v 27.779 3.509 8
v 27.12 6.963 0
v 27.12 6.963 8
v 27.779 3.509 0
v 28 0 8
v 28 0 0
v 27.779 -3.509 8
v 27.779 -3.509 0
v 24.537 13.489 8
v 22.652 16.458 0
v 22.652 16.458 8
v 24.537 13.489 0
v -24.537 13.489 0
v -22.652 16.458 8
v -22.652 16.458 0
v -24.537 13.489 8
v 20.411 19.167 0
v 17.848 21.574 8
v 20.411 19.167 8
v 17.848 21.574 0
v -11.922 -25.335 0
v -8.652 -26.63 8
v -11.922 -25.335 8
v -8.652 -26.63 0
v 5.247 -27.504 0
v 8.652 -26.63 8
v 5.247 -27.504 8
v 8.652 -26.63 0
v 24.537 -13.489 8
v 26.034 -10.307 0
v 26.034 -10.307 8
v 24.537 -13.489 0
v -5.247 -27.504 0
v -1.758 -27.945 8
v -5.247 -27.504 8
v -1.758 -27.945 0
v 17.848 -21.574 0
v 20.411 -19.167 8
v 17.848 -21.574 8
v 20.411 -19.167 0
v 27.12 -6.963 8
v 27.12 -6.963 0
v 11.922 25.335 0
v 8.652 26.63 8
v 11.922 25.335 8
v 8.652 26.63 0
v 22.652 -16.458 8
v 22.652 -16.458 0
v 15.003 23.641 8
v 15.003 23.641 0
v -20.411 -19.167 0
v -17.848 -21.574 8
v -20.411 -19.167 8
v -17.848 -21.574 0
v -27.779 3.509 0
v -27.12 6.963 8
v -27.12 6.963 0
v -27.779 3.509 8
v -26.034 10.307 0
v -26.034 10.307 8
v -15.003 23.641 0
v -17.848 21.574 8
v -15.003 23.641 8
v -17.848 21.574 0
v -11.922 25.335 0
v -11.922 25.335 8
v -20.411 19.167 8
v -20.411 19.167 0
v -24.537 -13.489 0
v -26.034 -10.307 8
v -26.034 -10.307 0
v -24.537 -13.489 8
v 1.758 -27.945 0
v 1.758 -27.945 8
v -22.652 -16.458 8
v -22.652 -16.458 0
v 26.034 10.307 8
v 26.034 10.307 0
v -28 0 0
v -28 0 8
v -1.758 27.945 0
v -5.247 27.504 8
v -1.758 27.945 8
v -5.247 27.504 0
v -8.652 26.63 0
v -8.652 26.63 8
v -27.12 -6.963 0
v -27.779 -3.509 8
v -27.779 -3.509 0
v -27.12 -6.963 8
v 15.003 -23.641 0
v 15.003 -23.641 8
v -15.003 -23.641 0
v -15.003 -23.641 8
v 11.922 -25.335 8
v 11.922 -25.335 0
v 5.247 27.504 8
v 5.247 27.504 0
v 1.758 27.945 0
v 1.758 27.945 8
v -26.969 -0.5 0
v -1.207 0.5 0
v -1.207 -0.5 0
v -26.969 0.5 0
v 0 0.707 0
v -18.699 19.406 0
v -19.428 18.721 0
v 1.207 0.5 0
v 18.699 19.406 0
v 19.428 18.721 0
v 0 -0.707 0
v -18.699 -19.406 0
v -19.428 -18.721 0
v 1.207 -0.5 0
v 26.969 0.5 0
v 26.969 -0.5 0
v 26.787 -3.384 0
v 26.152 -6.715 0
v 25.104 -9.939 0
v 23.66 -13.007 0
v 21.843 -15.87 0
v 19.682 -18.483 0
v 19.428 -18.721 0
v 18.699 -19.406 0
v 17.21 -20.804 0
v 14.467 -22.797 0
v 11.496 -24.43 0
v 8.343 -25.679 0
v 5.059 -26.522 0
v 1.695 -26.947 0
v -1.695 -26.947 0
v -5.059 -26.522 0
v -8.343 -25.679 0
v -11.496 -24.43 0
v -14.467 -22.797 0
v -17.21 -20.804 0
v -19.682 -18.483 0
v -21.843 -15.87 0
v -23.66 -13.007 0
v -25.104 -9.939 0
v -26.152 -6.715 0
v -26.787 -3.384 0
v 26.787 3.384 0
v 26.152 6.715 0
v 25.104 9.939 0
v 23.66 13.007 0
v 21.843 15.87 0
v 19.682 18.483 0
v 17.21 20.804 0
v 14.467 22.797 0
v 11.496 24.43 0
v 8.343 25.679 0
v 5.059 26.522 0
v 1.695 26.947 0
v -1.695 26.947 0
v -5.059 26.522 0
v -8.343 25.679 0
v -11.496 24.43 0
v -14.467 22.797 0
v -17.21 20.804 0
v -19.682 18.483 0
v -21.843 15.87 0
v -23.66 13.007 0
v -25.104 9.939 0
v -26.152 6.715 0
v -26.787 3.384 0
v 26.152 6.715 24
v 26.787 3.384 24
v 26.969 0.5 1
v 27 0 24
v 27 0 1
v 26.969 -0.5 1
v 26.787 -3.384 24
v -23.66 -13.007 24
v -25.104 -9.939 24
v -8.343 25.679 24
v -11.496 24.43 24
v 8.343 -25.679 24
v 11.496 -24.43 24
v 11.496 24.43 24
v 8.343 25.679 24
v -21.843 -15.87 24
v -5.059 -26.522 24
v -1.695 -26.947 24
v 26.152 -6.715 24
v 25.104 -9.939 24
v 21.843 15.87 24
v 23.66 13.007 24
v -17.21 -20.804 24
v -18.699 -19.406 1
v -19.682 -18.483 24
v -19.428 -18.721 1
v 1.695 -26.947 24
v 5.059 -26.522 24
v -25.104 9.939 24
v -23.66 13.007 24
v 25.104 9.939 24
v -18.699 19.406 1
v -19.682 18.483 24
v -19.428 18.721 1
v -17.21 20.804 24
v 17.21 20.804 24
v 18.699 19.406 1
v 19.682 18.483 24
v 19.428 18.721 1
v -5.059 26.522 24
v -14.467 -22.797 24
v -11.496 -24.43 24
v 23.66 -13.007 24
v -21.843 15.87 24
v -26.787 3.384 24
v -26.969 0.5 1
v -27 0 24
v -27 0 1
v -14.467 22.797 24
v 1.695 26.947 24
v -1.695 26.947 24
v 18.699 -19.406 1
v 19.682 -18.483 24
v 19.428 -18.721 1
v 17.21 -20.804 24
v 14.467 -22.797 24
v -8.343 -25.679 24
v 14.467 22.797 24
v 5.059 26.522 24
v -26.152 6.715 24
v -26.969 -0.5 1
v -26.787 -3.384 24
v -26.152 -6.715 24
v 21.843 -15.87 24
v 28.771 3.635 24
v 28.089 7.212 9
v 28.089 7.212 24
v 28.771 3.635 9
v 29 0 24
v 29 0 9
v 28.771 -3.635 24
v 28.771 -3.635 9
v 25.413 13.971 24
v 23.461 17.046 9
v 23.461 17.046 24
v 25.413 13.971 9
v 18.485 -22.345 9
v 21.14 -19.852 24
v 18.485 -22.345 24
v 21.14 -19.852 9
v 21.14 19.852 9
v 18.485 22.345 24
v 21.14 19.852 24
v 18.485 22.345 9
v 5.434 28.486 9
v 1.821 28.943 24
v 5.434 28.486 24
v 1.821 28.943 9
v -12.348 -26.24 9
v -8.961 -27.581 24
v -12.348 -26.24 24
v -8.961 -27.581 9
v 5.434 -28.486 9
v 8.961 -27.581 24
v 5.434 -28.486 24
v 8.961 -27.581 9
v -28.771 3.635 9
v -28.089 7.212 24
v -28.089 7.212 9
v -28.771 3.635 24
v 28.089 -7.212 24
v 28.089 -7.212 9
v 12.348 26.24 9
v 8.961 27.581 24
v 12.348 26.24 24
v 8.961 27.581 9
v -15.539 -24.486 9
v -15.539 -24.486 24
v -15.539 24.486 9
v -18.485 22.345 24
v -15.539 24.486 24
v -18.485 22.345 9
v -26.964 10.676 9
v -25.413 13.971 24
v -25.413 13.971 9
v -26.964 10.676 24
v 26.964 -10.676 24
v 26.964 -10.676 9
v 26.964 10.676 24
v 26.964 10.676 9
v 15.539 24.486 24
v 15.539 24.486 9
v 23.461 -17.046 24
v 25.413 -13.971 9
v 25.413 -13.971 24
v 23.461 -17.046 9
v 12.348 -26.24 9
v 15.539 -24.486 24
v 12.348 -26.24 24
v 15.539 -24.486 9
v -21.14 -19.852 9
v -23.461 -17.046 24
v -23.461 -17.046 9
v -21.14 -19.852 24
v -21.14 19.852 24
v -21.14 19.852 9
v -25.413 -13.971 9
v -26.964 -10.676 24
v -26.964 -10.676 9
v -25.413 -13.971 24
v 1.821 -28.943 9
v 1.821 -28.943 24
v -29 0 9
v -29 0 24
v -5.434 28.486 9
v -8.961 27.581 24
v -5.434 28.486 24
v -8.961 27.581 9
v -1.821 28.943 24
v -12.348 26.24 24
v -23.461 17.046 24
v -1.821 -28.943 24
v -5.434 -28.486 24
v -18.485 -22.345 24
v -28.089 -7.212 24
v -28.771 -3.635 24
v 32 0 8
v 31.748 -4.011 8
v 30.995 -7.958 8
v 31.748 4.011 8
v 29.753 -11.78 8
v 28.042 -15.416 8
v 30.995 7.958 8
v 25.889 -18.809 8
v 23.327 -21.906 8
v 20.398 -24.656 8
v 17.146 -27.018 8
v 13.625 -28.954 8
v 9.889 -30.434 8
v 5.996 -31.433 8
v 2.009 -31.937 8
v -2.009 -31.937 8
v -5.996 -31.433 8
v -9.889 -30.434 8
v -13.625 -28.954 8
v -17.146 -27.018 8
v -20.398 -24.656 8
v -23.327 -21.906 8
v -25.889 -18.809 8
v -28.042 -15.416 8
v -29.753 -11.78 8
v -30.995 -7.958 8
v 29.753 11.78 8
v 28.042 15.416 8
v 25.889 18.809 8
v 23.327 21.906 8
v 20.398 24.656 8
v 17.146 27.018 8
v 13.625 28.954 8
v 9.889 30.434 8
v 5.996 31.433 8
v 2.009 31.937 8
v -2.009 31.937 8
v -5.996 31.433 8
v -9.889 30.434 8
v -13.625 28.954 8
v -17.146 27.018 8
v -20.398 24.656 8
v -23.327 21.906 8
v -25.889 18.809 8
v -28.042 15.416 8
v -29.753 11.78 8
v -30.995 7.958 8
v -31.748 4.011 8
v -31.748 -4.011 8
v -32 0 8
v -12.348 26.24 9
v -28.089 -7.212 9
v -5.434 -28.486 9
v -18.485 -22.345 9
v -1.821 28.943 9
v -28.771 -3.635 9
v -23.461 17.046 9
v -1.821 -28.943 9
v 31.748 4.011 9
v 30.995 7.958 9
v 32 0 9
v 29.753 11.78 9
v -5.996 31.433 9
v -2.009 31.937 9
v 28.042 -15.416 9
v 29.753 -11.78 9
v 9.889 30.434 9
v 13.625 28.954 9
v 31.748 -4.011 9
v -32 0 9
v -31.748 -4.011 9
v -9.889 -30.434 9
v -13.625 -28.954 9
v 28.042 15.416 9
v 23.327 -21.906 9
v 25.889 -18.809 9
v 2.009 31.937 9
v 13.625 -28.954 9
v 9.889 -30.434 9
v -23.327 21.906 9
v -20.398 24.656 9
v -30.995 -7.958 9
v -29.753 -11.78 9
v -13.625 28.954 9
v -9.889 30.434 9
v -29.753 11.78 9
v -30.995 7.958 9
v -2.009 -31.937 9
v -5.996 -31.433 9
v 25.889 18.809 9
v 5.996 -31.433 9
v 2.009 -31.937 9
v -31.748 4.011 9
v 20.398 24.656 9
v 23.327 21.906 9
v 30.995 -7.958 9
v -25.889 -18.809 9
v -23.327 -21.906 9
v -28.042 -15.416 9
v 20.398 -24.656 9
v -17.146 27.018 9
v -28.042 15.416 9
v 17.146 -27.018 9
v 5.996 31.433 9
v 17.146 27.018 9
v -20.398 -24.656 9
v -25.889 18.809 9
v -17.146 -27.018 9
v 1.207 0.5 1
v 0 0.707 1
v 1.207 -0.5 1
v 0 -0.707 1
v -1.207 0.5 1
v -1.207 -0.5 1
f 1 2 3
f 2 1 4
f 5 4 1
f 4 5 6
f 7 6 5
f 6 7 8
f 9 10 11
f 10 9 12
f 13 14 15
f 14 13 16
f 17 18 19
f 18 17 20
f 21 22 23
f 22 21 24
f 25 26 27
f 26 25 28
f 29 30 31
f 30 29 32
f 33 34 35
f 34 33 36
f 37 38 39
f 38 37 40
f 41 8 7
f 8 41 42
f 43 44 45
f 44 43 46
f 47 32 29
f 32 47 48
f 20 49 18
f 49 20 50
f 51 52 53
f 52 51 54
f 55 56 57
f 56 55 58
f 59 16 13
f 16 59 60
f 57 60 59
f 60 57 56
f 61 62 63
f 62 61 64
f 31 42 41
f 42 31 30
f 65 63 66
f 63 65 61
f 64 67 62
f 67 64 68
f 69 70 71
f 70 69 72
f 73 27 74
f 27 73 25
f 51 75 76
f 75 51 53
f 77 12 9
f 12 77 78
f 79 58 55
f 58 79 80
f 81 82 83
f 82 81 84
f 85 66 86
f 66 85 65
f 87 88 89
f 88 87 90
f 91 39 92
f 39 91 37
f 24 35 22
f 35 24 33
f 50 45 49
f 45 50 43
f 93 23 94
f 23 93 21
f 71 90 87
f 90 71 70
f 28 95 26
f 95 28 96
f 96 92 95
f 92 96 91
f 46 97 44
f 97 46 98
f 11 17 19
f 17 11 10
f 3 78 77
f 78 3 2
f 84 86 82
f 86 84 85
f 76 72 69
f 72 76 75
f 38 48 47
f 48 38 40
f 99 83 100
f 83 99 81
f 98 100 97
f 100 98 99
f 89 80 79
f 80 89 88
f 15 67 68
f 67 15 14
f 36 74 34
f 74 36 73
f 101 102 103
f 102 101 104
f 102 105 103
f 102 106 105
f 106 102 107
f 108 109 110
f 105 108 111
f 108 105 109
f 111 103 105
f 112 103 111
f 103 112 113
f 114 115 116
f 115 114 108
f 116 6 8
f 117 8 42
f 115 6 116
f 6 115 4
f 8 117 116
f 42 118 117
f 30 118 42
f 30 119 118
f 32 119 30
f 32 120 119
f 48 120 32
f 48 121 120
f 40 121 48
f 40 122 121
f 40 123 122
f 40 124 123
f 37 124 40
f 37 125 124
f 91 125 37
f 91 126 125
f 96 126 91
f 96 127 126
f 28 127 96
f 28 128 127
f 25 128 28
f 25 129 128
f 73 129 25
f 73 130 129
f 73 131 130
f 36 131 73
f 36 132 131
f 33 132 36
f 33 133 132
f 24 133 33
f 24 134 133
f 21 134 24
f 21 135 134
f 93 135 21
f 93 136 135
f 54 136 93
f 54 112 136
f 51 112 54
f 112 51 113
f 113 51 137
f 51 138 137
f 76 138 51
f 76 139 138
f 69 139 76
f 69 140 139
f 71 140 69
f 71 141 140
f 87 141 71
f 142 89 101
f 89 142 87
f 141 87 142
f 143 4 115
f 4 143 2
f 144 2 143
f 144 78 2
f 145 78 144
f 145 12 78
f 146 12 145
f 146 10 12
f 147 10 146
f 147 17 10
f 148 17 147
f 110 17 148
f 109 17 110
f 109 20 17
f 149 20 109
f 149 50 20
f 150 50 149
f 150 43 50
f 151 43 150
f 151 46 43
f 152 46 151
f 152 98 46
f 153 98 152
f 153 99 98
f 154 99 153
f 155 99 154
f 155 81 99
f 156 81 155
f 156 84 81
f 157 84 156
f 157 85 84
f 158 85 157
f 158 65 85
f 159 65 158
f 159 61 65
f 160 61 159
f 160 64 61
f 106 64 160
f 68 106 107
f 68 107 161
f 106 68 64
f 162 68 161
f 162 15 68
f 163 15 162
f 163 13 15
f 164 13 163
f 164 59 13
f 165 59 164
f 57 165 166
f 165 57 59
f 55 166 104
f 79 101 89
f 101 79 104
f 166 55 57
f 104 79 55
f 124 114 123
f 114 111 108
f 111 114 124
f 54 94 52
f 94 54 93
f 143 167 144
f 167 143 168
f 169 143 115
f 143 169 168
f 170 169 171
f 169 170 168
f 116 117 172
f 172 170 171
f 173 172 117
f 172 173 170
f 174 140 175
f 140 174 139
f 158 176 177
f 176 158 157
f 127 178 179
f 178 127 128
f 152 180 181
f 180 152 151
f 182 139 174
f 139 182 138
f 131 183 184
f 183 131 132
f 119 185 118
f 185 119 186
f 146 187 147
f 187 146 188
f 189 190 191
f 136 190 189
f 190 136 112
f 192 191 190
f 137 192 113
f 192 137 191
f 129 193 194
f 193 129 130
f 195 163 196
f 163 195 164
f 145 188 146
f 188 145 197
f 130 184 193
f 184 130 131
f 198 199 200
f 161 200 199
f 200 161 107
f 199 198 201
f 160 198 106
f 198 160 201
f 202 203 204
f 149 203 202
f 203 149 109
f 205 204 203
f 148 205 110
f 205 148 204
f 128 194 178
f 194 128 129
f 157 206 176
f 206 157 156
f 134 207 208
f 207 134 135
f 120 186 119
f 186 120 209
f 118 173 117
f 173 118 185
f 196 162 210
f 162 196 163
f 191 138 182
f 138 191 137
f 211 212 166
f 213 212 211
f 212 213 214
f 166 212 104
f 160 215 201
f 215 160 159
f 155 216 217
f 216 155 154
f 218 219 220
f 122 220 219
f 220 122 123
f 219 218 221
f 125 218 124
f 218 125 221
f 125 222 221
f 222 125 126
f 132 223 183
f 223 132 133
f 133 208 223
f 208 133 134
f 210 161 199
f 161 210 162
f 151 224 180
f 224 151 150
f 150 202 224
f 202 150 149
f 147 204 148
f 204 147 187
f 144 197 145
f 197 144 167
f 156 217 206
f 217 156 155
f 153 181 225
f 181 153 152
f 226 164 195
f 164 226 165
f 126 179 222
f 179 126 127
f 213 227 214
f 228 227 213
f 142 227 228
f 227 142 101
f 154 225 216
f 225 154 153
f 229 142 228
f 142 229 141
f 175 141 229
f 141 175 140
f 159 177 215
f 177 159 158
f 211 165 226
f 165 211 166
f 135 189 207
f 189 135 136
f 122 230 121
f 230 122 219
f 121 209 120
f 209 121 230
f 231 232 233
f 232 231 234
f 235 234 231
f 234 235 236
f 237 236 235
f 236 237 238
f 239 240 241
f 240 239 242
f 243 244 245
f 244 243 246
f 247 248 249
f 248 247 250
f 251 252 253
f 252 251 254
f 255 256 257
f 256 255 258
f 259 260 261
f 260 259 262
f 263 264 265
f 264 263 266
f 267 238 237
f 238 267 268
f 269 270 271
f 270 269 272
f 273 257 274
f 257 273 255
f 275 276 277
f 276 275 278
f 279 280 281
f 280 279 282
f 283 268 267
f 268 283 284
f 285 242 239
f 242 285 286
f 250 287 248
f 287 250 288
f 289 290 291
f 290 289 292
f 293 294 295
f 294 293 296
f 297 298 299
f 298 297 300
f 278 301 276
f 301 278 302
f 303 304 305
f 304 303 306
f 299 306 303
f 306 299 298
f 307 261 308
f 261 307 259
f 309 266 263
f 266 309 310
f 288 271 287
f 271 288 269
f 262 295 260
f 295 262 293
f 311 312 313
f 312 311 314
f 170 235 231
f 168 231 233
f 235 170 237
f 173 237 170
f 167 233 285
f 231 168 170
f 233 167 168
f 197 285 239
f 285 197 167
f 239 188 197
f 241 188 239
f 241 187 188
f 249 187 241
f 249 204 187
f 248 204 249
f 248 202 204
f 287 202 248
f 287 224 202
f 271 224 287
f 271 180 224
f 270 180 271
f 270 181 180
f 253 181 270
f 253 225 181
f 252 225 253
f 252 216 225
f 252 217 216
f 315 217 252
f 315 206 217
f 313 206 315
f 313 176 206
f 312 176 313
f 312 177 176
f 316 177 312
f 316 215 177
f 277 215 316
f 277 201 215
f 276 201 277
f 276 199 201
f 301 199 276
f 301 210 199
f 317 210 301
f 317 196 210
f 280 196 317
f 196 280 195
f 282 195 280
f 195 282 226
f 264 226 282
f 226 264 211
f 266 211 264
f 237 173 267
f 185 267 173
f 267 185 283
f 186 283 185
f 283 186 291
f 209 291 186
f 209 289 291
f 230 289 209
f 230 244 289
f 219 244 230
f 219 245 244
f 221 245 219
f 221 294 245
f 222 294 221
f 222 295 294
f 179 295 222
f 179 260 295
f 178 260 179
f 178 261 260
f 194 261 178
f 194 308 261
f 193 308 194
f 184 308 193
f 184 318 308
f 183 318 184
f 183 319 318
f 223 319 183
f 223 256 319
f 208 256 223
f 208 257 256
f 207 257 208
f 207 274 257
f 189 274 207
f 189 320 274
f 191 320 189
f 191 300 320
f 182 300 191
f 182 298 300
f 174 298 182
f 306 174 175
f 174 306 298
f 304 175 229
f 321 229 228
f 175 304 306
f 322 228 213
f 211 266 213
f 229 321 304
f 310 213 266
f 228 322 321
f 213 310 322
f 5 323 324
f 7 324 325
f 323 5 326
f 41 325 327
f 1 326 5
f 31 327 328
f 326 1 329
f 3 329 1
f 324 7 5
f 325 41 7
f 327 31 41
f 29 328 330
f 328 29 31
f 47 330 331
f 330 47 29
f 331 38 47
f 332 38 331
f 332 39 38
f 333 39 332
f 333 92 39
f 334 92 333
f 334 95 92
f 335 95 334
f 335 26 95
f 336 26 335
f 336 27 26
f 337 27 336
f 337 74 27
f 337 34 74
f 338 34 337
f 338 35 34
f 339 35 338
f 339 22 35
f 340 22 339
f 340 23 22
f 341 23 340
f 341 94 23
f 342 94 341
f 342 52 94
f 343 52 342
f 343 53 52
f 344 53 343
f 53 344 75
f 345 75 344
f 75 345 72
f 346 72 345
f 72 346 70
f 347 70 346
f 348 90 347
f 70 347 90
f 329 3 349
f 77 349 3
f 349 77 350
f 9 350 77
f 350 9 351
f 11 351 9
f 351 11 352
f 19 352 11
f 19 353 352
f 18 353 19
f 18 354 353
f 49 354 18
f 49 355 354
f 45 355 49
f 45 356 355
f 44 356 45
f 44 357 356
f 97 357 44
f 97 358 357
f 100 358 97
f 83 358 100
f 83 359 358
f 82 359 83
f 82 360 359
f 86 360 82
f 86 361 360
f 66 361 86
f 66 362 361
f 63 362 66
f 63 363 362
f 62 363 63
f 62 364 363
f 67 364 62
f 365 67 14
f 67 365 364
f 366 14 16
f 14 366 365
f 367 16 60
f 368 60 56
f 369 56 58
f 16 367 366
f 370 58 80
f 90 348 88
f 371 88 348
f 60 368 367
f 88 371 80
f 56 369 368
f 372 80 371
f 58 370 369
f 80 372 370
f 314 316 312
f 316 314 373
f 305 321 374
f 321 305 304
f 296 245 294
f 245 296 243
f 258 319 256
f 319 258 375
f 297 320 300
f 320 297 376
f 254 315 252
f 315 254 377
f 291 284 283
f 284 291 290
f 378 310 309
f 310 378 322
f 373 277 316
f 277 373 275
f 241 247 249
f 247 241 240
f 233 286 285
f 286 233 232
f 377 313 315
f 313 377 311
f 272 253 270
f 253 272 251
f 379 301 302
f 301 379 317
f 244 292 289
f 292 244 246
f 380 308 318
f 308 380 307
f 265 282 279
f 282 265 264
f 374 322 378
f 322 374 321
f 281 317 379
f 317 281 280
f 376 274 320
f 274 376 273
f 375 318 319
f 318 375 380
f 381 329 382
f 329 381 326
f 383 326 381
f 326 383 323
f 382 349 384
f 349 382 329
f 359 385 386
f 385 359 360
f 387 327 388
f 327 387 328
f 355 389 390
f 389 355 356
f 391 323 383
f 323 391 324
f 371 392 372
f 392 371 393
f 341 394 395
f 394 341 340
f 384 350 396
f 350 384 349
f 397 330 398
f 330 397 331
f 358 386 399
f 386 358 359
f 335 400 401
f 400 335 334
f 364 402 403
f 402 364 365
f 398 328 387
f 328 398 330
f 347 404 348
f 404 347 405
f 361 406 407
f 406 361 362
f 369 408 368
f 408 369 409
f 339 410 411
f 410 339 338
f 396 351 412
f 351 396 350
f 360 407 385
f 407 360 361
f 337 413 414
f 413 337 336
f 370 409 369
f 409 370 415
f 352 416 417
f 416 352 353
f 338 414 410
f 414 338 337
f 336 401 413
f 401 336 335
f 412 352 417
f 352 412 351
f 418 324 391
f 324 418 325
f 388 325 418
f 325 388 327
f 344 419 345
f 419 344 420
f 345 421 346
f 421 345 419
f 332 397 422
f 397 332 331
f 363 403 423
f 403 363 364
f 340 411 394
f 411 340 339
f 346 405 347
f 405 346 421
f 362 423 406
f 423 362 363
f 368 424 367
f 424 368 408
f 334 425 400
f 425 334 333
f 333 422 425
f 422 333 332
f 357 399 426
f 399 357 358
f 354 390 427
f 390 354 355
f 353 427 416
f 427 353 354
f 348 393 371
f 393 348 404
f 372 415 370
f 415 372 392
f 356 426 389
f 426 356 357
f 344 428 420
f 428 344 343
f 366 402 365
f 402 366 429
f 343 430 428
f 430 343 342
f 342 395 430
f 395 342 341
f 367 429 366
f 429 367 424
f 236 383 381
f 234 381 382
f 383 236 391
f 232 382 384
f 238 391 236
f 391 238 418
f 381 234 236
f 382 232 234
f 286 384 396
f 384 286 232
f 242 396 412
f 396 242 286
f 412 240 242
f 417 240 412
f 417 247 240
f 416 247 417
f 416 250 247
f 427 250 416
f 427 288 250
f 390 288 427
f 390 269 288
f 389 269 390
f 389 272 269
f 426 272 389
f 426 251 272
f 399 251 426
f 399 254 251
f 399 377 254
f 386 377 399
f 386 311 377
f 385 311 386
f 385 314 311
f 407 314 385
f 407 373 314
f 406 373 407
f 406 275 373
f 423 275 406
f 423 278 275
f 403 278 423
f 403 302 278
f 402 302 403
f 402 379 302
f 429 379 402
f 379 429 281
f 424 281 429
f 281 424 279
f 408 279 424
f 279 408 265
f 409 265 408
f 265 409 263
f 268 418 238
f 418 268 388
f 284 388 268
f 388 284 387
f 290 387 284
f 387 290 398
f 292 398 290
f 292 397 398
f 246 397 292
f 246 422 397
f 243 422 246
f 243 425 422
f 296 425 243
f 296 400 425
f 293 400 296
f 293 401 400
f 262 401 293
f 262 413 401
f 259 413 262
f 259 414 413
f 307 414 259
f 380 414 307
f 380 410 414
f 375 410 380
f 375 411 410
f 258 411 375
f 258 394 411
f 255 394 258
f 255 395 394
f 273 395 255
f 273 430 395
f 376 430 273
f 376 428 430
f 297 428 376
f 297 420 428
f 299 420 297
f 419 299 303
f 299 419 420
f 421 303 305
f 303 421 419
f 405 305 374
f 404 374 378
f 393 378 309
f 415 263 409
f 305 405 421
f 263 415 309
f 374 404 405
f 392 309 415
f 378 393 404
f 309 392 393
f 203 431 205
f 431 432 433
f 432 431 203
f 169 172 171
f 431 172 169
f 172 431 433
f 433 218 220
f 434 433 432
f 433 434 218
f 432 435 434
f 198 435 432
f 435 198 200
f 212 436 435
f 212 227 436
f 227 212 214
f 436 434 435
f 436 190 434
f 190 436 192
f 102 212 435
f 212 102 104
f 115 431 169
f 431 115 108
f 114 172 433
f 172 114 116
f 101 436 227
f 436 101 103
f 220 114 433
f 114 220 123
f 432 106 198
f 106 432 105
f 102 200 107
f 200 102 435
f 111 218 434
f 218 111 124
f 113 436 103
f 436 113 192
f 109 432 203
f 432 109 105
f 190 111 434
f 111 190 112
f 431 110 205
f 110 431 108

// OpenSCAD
/*
Description: Coffee Groomer designed to evenly
distribute coffee grind within the portafilter 
basket before tamping.

Created by: Alan Lin
Date: 4/20/2018
*/

module groomer(depth, height, radius){
    $fn=50;

    difference(){ // bottom silo
        // outside wall
        cylinder(depth + 2, radius, radius);
        // inside wall
        cylinder(depth + 2, radius - 1, radius - 1);
    }
    // top rim
    translate([0, 0, depth - 2]){    
        difference(){ // top silo
            // outside wall
            cylinder(height, radius + 1, radius + 1); 
            // inside wall
            cylinder(height, radius - 1, radius - 1);
        }
        difference(){ // top hat rim
            // outside
            cylinder(1, radius + 4, radius + 4);
            // inside
            cylinder(1, radius, radius);
        }
    }
    // groom bridges
    translate([-(radius-1), -.5, 0]){
        cube([((radius-1)*2)+.25, 1, 1]);
    }
    rotate(a=-45, v=[0, 0, 1]){
        translate([-(radius-1), -.5, 0]){
            cube([((radius-1)*2)+.25, 1, 1]);
        }
    }
    rotate(a=45, v=[0, 0, 1]){
        translate([-(radius-1), -.5, 0]){
            cube([((radius-1)*2)+.25, 1, 1]);
        }
    }
}
//(depth, height, radius)
groomer(10, 16, 28);
